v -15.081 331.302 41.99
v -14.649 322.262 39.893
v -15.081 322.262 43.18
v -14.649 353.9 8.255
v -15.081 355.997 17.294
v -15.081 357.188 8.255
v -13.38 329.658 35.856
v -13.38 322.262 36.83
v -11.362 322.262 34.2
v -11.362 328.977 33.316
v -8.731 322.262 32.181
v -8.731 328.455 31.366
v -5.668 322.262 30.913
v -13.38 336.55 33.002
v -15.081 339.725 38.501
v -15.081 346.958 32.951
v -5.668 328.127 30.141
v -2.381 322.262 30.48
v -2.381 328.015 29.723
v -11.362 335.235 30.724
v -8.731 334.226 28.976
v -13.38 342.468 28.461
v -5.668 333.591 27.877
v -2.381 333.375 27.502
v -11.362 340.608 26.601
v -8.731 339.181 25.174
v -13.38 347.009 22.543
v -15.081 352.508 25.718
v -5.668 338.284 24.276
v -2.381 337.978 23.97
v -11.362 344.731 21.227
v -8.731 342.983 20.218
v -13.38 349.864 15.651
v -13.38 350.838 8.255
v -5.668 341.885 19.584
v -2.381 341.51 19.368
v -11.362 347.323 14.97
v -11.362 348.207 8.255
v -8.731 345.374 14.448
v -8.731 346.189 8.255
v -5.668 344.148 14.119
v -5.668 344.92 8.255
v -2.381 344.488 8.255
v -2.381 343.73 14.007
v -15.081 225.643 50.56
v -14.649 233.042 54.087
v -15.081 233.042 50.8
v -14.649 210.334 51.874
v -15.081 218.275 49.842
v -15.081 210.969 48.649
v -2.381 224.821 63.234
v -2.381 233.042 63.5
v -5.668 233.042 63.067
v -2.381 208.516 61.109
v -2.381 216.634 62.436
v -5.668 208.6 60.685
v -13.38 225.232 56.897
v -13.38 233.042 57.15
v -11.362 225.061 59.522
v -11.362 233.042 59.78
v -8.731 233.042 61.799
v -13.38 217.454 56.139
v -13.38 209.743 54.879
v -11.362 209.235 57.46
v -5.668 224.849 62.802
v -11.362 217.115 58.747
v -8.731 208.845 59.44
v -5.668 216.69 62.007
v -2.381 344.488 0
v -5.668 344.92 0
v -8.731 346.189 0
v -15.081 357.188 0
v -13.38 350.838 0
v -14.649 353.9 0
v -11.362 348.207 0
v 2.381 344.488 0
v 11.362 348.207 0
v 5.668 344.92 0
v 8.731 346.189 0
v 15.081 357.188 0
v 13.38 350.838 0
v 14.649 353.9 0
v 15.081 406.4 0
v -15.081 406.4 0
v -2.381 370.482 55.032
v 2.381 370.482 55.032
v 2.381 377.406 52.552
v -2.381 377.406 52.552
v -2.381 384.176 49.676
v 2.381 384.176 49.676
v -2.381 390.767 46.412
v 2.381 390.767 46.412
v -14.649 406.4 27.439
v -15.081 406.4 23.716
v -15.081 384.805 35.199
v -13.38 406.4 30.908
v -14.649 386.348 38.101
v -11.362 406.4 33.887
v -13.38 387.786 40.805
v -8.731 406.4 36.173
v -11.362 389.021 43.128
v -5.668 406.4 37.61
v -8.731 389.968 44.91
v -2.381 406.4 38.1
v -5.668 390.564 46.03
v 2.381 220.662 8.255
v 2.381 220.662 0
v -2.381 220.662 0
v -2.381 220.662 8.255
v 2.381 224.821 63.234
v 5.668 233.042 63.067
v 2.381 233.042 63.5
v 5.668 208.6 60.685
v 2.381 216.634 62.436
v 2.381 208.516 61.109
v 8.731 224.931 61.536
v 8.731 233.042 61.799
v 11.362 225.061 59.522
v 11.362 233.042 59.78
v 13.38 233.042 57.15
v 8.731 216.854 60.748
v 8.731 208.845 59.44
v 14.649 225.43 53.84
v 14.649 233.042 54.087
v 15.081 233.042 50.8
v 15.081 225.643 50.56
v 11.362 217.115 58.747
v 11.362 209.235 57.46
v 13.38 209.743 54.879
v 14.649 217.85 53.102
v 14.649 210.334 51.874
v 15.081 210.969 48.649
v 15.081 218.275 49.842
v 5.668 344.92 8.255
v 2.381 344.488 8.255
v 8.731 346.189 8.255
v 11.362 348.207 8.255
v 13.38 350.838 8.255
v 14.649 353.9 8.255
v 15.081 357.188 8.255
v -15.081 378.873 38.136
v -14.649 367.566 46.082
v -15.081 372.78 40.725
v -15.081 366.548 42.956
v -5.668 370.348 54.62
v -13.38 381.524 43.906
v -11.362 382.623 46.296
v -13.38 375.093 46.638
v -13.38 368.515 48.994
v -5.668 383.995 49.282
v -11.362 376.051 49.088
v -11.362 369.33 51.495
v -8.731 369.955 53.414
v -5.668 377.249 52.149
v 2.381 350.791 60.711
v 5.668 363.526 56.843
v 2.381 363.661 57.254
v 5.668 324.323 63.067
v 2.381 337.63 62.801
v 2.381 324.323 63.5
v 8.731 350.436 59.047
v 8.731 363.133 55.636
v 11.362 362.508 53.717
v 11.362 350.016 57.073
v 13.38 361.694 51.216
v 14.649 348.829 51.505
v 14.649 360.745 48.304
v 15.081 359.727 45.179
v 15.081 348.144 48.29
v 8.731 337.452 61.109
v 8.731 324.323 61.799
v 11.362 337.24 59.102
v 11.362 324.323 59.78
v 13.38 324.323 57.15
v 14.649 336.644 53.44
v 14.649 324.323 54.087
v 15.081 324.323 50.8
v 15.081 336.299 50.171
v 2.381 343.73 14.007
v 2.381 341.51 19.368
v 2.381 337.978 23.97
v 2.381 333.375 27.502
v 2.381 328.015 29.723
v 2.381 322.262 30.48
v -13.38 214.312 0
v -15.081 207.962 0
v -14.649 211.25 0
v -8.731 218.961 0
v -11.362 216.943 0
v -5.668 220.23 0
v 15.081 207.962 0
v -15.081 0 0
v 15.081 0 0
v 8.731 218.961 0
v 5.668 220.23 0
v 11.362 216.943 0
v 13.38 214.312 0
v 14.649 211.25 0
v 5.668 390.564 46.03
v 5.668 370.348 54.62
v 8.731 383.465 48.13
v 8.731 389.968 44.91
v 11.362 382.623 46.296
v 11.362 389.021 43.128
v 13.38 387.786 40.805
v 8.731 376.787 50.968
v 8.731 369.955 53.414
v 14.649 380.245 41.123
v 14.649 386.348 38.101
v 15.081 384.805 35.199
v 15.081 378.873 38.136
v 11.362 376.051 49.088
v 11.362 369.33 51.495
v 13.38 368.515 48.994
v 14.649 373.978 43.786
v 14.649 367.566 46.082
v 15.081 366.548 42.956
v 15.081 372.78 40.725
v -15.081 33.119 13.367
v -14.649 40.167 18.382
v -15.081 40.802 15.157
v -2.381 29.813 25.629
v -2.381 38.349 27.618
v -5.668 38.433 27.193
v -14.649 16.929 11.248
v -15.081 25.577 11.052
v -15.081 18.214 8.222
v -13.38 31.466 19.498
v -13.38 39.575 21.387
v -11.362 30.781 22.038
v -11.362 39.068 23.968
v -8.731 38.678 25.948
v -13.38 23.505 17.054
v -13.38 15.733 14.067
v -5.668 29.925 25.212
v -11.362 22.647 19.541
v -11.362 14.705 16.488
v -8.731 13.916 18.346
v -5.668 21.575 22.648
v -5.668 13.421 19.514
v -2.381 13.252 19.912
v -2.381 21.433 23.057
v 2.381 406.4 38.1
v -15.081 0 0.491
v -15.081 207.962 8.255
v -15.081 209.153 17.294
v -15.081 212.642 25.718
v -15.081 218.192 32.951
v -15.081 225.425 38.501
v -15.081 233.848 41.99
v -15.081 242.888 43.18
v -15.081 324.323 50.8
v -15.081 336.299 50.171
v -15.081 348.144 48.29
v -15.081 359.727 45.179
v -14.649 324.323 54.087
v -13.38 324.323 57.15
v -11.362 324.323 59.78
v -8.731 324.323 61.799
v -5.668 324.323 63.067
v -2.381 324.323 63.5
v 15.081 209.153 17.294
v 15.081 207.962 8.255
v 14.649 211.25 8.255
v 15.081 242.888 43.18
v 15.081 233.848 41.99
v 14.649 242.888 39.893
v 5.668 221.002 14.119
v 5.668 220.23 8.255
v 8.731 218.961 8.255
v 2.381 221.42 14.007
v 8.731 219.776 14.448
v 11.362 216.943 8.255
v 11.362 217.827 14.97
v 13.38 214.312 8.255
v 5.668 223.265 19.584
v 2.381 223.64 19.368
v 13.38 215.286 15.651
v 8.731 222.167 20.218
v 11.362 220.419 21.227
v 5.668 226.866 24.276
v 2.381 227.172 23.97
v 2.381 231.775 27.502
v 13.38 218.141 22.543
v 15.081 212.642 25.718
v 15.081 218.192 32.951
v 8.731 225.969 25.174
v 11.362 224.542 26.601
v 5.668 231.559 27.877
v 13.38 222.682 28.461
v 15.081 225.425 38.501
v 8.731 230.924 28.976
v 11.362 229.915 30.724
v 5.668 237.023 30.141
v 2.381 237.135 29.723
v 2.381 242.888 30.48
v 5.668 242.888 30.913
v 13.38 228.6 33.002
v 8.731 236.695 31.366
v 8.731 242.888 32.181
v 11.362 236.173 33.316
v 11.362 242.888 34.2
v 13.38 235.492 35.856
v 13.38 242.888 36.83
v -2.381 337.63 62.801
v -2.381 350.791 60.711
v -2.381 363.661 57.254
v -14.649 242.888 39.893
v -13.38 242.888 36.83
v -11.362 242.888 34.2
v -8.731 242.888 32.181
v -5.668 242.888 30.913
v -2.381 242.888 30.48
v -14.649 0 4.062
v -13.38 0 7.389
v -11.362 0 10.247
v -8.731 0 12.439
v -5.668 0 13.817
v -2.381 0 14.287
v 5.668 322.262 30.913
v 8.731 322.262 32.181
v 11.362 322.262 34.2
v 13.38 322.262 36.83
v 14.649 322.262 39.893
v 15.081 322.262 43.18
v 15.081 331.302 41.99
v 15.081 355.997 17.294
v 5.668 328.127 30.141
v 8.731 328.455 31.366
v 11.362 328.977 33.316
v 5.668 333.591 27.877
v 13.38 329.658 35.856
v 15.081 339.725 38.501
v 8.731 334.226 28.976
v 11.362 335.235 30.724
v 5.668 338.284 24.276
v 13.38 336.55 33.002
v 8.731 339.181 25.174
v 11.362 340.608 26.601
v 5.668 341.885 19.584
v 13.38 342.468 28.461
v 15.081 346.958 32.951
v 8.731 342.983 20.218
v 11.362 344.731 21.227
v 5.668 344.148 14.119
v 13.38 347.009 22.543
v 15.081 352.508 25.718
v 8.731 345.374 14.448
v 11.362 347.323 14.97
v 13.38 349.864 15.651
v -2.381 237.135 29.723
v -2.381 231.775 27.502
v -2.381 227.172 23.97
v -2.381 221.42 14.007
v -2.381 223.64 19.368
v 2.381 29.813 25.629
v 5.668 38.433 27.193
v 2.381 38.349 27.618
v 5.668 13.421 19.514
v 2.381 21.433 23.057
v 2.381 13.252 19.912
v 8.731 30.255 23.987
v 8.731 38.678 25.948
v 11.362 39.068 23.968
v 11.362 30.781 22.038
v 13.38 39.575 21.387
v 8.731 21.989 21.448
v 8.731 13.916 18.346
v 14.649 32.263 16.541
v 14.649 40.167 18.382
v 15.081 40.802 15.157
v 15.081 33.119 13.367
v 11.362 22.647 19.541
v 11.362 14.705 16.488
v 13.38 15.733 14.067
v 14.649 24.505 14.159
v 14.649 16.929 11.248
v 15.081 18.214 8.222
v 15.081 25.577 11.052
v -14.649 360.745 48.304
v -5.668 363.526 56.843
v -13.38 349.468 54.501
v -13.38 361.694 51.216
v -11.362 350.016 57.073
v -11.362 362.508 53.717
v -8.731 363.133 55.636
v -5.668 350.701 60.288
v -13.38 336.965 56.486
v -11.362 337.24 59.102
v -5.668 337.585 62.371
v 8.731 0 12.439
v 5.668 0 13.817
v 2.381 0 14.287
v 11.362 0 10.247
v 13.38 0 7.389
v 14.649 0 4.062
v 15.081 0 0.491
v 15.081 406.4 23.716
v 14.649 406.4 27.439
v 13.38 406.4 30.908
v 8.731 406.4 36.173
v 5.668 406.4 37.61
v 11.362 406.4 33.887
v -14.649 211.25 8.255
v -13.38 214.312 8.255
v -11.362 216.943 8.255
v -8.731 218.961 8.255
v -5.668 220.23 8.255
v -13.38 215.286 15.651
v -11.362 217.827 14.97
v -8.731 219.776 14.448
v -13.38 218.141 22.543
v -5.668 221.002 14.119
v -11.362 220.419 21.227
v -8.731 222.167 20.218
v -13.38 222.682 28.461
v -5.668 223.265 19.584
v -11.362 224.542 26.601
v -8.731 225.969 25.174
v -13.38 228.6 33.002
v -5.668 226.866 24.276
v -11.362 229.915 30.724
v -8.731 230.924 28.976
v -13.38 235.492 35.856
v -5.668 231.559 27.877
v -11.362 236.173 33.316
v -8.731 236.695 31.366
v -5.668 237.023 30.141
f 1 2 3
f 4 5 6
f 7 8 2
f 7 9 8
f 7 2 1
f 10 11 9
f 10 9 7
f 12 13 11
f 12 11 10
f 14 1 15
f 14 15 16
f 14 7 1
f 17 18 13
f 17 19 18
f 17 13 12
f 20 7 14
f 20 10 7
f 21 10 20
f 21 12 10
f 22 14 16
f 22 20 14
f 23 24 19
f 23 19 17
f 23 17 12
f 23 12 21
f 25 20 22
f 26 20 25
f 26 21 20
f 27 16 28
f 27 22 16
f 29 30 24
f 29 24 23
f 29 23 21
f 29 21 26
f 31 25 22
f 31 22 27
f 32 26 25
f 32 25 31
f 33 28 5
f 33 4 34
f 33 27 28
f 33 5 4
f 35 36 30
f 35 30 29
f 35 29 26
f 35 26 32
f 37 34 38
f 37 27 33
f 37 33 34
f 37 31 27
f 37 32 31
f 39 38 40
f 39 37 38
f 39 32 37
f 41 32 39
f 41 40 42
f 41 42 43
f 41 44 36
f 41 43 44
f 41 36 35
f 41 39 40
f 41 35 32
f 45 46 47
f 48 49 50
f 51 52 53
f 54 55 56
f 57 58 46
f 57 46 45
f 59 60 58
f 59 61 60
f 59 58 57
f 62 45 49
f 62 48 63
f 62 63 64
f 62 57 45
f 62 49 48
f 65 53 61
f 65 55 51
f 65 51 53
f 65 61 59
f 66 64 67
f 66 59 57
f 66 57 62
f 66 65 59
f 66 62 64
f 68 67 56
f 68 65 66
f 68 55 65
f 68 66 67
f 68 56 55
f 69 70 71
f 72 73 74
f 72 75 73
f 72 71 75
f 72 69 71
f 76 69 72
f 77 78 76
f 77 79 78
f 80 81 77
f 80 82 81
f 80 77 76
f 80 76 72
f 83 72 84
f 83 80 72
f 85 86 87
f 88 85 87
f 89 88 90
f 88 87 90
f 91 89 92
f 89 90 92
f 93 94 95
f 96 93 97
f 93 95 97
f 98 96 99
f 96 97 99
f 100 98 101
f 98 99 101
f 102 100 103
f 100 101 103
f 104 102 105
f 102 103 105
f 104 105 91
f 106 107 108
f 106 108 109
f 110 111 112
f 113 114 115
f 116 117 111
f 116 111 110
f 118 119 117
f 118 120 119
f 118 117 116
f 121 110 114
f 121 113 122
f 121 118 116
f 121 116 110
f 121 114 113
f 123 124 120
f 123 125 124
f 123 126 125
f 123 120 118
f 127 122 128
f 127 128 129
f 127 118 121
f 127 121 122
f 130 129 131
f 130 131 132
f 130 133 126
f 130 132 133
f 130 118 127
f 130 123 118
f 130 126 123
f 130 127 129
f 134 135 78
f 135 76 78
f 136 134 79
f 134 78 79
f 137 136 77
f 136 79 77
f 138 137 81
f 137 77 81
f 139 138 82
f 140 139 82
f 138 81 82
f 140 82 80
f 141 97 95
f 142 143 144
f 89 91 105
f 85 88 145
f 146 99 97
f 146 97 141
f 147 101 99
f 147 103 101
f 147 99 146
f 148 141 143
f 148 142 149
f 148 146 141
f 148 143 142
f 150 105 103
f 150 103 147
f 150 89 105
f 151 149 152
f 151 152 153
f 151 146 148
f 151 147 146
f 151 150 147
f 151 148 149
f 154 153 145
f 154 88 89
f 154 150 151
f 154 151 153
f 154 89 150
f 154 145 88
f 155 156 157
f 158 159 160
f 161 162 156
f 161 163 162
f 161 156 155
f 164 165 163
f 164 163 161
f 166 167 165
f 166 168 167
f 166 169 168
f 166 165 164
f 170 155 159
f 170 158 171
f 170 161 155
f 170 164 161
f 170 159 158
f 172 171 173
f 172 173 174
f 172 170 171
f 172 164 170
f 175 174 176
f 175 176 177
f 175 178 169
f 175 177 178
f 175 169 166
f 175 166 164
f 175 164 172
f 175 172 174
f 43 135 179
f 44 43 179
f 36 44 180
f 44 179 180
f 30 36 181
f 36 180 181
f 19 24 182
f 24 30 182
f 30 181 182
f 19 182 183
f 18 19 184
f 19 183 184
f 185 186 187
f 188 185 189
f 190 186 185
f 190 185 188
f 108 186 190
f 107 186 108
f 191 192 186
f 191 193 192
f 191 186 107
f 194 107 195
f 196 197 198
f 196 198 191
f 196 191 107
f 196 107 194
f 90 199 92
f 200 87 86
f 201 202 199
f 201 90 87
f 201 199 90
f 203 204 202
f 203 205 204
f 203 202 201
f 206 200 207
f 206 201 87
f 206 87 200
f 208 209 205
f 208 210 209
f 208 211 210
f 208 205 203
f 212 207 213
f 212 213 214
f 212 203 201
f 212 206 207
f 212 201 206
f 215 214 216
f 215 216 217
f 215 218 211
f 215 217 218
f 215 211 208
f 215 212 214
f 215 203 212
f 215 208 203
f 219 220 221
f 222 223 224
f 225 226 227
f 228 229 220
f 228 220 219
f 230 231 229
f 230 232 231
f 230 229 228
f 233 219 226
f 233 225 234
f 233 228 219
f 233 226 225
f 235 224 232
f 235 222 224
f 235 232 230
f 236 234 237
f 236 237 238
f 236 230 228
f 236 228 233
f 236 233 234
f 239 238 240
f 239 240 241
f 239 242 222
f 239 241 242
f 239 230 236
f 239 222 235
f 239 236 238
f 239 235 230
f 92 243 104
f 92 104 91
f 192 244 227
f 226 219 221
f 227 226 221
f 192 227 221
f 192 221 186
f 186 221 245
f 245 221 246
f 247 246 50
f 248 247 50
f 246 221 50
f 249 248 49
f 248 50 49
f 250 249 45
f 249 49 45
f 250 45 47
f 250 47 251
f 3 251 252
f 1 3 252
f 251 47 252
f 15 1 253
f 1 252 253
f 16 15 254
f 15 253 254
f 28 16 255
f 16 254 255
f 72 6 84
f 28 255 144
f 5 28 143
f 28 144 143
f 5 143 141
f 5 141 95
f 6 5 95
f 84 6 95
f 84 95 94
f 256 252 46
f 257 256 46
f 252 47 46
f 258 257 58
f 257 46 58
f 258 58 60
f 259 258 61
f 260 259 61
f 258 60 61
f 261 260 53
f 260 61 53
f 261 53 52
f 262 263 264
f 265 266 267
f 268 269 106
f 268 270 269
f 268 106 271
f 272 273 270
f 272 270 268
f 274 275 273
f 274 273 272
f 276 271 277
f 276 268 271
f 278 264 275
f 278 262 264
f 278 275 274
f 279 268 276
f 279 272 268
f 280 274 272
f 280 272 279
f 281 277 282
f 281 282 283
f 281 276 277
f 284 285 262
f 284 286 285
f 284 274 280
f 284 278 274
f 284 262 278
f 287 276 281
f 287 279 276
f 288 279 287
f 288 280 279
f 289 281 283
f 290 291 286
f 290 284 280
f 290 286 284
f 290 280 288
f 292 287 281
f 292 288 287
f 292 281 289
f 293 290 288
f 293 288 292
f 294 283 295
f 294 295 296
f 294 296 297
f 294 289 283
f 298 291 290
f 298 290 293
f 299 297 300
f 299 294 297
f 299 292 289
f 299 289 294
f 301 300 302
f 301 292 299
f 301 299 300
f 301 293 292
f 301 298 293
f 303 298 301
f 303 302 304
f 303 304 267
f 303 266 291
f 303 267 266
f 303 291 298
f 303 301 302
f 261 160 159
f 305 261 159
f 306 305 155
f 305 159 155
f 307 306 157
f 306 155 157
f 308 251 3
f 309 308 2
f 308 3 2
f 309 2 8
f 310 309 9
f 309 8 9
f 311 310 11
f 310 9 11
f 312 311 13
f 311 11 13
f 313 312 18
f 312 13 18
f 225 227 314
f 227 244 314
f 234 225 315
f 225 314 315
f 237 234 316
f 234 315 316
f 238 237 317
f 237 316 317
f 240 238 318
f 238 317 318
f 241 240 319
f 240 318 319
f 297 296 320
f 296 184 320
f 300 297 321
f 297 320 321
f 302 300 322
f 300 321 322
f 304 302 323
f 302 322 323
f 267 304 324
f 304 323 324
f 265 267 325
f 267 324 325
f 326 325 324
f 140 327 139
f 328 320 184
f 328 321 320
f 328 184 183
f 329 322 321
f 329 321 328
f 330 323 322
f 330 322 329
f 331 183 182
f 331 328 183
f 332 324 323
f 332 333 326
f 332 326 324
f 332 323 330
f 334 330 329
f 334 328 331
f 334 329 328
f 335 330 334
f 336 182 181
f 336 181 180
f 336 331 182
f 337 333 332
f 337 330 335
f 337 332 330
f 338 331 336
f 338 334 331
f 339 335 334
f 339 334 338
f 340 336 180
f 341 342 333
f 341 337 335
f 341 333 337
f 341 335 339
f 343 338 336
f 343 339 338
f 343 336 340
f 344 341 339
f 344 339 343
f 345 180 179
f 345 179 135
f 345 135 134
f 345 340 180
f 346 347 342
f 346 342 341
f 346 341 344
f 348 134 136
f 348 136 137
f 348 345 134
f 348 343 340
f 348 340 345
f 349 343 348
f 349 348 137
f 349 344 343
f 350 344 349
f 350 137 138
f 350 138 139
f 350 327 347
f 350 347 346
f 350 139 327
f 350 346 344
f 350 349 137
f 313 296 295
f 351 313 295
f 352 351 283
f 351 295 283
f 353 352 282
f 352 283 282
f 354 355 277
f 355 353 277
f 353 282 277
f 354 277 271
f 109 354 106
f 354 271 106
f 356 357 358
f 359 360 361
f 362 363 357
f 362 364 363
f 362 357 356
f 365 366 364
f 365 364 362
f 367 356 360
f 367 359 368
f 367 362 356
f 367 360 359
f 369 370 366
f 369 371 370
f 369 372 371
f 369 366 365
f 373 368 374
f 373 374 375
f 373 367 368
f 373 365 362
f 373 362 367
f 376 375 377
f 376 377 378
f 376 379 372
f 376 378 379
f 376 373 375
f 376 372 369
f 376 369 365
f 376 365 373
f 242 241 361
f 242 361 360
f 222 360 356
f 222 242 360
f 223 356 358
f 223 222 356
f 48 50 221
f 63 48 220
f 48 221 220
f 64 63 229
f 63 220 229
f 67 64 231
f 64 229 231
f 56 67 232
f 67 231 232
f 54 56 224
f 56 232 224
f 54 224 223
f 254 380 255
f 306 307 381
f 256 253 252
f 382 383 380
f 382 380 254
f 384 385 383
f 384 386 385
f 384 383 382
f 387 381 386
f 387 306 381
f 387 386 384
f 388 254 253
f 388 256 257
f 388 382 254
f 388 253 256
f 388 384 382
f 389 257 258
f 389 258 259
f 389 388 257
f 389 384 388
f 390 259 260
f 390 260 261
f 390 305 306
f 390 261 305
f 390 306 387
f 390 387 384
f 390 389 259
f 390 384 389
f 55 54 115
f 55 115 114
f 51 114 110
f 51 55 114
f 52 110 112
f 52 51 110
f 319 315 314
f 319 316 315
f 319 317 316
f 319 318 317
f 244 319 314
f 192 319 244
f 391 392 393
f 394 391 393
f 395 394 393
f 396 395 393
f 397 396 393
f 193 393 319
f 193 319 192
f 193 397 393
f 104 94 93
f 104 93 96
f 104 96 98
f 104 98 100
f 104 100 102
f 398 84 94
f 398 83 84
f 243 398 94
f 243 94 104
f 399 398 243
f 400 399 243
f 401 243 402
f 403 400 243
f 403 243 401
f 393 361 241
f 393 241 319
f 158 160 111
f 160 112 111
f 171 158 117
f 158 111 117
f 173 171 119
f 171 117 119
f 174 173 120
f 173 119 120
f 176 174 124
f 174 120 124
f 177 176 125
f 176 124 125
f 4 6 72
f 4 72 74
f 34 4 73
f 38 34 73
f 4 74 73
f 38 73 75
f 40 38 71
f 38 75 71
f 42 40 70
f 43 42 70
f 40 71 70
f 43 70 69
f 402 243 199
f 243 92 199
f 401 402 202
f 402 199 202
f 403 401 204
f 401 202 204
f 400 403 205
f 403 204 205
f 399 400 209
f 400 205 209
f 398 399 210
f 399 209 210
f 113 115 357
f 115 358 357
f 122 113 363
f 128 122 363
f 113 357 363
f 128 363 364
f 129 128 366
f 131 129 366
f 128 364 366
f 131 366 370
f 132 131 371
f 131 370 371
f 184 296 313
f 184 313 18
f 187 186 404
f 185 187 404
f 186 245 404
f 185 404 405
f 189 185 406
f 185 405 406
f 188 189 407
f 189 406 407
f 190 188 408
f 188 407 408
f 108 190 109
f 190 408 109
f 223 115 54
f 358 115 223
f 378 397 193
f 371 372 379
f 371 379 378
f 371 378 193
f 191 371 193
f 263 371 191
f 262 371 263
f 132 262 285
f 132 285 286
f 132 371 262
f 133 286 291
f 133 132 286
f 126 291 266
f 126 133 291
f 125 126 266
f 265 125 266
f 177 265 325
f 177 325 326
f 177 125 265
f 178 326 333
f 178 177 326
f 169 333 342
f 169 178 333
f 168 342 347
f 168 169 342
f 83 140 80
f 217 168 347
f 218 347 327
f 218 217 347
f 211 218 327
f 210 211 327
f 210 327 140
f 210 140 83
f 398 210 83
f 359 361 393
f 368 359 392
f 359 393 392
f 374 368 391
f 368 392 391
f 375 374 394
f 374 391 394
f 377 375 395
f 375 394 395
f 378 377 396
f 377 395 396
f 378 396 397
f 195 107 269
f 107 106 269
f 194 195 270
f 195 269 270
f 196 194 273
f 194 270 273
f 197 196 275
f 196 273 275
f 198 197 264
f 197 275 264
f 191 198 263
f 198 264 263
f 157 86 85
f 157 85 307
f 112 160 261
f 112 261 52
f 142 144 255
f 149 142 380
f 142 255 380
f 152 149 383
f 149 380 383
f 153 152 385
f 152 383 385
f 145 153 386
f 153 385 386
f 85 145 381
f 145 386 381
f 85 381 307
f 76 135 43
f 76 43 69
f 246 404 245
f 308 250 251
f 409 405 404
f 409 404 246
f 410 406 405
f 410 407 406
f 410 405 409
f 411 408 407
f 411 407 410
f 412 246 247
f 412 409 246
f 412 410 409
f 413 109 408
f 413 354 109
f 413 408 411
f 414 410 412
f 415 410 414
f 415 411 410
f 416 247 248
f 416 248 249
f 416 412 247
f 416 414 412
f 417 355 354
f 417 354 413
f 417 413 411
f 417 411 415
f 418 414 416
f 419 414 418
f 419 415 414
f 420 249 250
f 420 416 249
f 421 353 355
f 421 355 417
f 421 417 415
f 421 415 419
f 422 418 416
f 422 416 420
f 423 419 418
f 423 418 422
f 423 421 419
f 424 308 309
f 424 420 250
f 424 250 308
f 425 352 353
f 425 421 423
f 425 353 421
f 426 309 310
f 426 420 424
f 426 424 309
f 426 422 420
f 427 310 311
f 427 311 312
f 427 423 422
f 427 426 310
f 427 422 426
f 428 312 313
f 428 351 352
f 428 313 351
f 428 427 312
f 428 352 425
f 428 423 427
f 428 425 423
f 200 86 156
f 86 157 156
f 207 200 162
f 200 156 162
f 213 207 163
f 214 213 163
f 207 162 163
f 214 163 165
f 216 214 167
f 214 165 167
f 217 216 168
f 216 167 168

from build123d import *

# Parameters (mm, degrees)
F1_DEPTH      = 15.08125
F1_DEPTH_BACK = 15.08125
F2_R          = 127
F3_R          = 22.225
F4_R          = 12.7


with BuildPart() as f1:
    # F0 (on Right) → F1 (new body, two sides)
    with BuildSketch(Plane.YZ) as f1_sk:
        Polygon((0, 14.2875), (0, 0), (220.6625, 0), (220.6625, 30.48), (344.4875, 30.48), (344.4875, 0), (406.4, 0), (406.4, 38.1), (381, 51.60542), (344.4875, 63.5), (220.6625, 63.5), (25.4, 25.06916), align=None)
    extrude(amount=F1_DEPTH)
    extrude(f1_sk.sketch, amount=-F1_DEPTH_BACK)

    # F2
    f2_edges = [f1.edges().sort_by_distance(p)[0] for p in [
        (0, 25.4, 25.06916),
        (0, 381, 51.60542),
        (0, 344.4875, 63.5),
        (0, 220.6625, 63.5),
    ]]
    fillet(f2_edges, radius=F2_R)

    # F3
    f3_edges = [f1.edges().sort_by_distance(p)[0] for p in [
        (0, 220.6625, 30.48),
        (0, 344.4875, 30.48),
    ]]
    fillet(f3_edges, radius=F3_R)

    # F4
    f4_edges = [f1.edges().sort_by_distance(p)[0] for p in [
        (15.08125, 282.575, 30.48),
        (15.08125, 278.682185, 63.5),
        (-15.08125, 278.682185, 63.5),
        (-15.08125, 282.575, 30.48),
    ]]
    fillet(f4_edges, radius=F4_R)


solid = f1.part
